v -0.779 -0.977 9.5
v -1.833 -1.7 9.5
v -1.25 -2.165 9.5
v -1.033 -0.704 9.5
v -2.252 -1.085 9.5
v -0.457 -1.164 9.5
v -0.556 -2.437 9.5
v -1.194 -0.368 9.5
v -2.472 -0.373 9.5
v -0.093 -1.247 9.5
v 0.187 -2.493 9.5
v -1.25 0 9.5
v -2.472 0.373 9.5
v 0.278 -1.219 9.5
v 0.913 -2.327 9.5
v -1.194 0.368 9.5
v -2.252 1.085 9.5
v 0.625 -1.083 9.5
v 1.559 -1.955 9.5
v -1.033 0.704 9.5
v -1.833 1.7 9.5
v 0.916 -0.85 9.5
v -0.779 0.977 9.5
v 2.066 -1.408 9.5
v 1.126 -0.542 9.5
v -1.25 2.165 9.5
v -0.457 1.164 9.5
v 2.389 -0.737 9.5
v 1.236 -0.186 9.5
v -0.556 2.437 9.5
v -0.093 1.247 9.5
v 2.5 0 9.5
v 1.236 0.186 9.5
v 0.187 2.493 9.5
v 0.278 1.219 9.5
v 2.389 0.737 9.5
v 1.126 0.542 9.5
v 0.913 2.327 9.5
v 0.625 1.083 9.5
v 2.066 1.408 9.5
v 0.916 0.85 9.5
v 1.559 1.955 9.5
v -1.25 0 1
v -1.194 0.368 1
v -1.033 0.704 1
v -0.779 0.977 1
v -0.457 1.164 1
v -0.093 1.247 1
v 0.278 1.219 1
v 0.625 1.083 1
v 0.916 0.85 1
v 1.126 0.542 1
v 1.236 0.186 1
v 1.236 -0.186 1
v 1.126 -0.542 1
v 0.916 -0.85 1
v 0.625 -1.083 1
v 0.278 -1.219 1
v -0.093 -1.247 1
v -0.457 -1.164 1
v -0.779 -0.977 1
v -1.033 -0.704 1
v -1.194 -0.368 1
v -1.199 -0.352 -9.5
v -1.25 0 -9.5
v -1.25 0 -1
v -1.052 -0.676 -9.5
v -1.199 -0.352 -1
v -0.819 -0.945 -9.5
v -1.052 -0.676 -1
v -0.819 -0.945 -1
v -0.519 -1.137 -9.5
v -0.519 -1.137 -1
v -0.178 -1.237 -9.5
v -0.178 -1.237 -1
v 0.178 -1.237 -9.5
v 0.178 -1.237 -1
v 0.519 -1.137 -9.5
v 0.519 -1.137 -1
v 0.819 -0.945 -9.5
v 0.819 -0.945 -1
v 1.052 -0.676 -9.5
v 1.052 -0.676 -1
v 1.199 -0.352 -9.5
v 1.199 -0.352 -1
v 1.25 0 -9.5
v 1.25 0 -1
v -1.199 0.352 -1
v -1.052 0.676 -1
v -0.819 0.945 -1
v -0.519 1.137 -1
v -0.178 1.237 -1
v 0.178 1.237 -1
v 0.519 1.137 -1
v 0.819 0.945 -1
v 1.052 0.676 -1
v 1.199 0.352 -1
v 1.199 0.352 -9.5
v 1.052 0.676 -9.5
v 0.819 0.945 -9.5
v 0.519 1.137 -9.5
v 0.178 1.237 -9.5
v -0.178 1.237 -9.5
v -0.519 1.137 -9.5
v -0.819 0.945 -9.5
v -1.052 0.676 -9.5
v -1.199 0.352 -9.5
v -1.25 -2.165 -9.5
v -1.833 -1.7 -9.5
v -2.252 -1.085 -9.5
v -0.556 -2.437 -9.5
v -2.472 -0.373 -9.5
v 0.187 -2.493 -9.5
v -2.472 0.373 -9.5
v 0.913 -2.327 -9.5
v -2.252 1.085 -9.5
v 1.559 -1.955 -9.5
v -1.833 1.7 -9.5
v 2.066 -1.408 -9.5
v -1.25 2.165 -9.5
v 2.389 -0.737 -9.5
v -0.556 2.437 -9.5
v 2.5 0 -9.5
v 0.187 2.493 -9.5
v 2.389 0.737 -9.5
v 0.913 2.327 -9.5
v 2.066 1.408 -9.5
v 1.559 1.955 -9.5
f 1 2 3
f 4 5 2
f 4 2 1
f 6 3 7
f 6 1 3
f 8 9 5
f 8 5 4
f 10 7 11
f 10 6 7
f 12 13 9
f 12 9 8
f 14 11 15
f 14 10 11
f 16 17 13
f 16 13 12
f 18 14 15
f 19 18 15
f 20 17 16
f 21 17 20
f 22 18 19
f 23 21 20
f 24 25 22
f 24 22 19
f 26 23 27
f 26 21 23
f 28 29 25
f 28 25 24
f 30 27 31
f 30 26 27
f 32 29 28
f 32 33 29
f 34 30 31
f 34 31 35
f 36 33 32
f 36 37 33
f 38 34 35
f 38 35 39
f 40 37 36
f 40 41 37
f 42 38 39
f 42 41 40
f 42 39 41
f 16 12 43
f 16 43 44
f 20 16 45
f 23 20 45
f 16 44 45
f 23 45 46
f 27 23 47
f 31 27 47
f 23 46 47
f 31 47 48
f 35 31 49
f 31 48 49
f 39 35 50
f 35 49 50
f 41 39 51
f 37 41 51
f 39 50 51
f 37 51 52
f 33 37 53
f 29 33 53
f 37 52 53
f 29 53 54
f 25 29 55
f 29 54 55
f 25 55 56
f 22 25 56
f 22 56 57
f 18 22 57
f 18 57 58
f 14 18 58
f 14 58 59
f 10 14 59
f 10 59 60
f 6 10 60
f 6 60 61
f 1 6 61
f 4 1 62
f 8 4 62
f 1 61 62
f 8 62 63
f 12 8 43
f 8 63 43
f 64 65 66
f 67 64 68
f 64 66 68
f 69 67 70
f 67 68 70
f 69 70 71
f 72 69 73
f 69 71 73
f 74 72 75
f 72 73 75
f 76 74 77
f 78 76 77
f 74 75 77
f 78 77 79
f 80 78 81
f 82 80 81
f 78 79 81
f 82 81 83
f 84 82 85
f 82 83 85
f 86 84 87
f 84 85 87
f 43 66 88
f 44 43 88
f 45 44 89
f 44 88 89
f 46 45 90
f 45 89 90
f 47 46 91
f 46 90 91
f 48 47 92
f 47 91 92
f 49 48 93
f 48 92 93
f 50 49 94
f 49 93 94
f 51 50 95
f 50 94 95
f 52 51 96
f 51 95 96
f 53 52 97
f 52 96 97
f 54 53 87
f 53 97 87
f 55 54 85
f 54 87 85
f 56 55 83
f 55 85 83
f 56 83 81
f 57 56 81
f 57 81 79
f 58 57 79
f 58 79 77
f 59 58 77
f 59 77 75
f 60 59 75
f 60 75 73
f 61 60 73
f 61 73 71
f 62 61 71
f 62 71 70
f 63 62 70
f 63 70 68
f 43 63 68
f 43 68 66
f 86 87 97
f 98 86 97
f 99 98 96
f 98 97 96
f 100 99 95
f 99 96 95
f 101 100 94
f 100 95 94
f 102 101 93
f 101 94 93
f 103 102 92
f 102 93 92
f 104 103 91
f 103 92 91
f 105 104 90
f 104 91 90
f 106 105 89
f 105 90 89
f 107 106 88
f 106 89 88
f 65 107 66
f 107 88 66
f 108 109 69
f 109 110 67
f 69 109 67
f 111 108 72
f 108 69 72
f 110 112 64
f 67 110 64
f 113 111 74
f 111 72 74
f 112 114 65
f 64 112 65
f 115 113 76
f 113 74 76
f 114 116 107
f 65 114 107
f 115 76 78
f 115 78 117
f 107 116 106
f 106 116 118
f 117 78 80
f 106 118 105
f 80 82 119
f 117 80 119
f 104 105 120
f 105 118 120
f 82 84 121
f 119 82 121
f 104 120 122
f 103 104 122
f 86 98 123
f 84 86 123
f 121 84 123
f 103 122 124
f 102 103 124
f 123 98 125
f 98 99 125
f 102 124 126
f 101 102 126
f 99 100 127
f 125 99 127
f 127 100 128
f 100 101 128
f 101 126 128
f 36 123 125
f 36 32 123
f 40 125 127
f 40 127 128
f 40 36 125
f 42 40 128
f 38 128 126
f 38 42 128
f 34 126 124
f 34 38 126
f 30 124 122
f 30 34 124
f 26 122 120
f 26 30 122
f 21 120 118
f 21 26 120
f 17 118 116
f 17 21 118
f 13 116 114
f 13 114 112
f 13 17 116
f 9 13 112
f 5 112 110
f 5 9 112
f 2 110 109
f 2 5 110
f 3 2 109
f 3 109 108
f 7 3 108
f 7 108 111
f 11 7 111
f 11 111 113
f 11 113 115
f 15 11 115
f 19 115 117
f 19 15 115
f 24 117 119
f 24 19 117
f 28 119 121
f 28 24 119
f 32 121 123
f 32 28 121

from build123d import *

# Parameters (mm, degrees)
SKETCH_1_R               = 2.5
EXTRUDE_1_DEPTH          = 9.5
M3X0_5_1_D               = 2.5
M3X0_5_1_DEPTH           = 8.5
M3X0_5_1_TIP             = 0.751075774
M3X0_5_1_ON_FACE_2_D     = 2.5
M3X0_5_1_ON_FACE_2_DEPTH = 8.5
M3X0_5_1_ON_FACE_2_TIP   = 0.751075774
SKETCH_3_R               = 1.25
CUT_EXTRUDE_1_DEPTH      = 19


with BuildPart() as part:
    # ｽｹｯﾁ1 → ﾎﾞｽ - 押し出し1 (new body, symmetric)
    with BuildSketch(Plane.XY):
        Circle(SKETCH_1_R)
    extrude(amount=EXTRUDE_1_DEPTH, both=True)

    # M3x0.5 ねじ穴1
    with Locations(Plane.XY.offset(9.5)):
        with Locations((0, 0)):
            Hole(M3X0_5_1_D / 2, depth=M3X0_5_1_DEPTH)
            with Locations((0, 0, -(M3X0_5_1_DEPTH + M3X0_5_1_TIP / 2))):  # 118° drill point
                Cone(0, M3X0_5_1_D / 2, M3X0_5_1_TIP, mode=Mode.SUBTRACT)

    # M3x0.5 ねじ穴1 on face 2
    with Locations(Plane(origin=(0, 0, -9.5), x_dir=(-1, 0, 0), z_dir=(0, 0, -1))):
        with Locations((0, 0)):
            Hole(M3X0_5_1_ON_FACE_2_D / 2, depth=M3X0_5_1_ON_FACE_2_DEPTH)
            with Locations((0, 0, -(M3X0_5_1_ON_FACE_2_DEPTH + M3X0_5_1_ON_FACE_2_TIP / 2))):  # 118° drill point
                Cone(0, M3X0_5_1_ON_FACE_2_D / 2, M3X0_5_1_ON_FACE_2_TIP, mode=Mode.SUBTRACT)

    # ｽｹｯﾁ3 → ｶｯﾄ - 押し出し1 (cut)
    with BuildSketch(Plane(origin=(0, 0, -9.5), x_dir=(-1, 0, 0), z_dir=(0, 0, -1))):
        Circle(SKETCH_3_R)
    extrude(amount=-CUT_EXTRUDE_1_DEPTH, mode=Mode.SUBTRACT)


solid = part.part
